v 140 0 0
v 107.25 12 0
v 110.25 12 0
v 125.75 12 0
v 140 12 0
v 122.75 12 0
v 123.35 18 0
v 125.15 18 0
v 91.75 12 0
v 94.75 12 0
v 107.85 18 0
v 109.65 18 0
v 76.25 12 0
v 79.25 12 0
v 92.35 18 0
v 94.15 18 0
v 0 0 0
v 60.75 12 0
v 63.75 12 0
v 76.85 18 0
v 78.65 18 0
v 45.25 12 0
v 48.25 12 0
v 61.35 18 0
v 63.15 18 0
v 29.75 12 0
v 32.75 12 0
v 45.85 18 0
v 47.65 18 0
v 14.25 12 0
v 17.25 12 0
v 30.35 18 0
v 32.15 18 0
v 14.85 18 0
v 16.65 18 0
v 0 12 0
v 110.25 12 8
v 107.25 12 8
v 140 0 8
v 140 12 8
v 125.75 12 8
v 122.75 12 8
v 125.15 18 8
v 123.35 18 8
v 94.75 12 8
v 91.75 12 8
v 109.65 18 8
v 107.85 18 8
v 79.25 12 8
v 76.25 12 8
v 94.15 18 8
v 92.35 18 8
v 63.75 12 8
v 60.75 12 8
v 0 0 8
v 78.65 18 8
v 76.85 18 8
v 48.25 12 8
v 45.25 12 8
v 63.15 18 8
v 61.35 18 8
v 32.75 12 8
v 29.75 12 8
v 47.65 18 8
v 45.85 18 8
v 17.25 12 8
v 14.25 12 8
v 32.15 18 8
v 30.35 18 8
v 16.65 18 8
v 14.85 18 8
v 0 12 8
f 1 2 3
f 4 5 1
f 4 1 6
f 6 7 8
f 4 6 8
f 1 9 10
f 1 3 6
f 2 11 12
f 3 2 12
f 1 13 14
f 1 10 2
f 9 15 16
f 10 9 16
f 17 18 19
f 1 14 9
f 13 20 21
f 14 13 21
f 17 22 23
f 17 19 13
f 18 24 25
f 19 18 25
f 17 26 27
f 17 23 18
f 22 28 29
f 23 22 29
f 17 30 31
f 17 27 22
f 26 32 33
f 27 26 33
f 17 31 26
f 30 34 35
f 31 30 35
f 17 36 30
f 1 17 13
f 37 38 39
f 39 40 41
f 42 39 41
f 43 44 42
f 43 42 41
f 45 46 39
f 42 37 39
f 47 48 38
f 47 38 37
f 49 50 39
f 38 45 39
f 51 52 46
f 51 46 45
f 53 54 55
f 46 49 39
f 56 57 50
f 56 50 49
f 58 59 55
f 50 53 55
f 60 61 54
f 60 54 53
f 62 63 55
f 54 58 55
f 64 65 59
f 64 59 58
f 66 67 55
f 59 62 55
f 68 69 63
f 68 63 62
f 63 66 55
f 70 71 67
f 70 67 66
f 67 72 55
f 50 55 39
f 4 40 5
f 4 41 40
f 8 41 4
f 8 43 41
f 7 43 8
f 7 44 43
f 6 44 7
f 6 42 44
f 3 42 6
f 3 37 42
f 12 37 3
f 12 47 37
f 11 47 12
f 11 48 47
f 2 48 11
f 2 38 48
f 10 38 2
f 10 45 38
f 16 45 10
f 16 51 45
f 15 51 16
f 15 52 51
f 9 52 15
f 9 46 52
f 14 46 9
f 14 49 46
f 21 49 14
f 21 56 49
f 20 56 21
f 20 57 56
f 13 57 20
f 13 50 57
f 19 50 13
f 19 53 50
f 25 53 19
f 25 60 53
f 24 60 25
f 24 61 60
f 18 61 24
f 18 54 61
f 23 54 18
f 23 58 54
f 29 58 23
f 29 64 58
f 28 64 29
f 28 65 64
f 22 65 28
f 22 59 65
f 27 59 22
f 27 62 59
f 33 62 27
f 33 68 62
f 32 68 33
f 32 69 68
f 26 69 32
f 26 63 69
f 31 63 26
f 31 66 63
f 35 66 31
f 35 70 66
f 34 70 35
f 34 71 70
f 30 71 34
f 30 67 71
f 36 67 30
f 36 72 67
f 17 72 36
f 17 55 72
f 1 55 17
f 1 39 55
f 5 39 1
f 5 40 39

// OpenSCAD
$fn = 32;

// ----------------------------------------------------------------------
// Gear rack: 8 teeth on a 140 mm bar, pitch 15.5 mm
// ----------------------------------------------------------------------

// --- parameters (mm) ---
profile_height = 8;       // extrusion height
profile_points = 36;      // points of the closed outline

profile = [[0, 0], [140, 0], [140, 12], [125.75, 12], [125.15, 18], [123.35, 18], [122.75, 12], [110.25, 12], [109.65, 18], [107.85, 18], [107.25, 12], [94.75, 12], [94.15, 18], [92.35, 18], [91.75, 12], [79.25, 12], [78.65, 18], [76.85, 18], [76.25, 12], [63.75, 12], [63.15, 18], [61.35, 18], [60.75, 12], [48.25, 12], [47.65, 18], [45.85, 18], [45.25, 12], [32.75, 12], [32.15, 18], [30.35, 18], [29.75, 12], [17.25, 12], [16.65, 18], [14.85, 18], [14.25, 12], [0, 12]];  // single closed polygon, 36 points, counter clockwise

// --- the one profile operation ---
linear_extrude(height = profile_height) polygon(points = profile);
